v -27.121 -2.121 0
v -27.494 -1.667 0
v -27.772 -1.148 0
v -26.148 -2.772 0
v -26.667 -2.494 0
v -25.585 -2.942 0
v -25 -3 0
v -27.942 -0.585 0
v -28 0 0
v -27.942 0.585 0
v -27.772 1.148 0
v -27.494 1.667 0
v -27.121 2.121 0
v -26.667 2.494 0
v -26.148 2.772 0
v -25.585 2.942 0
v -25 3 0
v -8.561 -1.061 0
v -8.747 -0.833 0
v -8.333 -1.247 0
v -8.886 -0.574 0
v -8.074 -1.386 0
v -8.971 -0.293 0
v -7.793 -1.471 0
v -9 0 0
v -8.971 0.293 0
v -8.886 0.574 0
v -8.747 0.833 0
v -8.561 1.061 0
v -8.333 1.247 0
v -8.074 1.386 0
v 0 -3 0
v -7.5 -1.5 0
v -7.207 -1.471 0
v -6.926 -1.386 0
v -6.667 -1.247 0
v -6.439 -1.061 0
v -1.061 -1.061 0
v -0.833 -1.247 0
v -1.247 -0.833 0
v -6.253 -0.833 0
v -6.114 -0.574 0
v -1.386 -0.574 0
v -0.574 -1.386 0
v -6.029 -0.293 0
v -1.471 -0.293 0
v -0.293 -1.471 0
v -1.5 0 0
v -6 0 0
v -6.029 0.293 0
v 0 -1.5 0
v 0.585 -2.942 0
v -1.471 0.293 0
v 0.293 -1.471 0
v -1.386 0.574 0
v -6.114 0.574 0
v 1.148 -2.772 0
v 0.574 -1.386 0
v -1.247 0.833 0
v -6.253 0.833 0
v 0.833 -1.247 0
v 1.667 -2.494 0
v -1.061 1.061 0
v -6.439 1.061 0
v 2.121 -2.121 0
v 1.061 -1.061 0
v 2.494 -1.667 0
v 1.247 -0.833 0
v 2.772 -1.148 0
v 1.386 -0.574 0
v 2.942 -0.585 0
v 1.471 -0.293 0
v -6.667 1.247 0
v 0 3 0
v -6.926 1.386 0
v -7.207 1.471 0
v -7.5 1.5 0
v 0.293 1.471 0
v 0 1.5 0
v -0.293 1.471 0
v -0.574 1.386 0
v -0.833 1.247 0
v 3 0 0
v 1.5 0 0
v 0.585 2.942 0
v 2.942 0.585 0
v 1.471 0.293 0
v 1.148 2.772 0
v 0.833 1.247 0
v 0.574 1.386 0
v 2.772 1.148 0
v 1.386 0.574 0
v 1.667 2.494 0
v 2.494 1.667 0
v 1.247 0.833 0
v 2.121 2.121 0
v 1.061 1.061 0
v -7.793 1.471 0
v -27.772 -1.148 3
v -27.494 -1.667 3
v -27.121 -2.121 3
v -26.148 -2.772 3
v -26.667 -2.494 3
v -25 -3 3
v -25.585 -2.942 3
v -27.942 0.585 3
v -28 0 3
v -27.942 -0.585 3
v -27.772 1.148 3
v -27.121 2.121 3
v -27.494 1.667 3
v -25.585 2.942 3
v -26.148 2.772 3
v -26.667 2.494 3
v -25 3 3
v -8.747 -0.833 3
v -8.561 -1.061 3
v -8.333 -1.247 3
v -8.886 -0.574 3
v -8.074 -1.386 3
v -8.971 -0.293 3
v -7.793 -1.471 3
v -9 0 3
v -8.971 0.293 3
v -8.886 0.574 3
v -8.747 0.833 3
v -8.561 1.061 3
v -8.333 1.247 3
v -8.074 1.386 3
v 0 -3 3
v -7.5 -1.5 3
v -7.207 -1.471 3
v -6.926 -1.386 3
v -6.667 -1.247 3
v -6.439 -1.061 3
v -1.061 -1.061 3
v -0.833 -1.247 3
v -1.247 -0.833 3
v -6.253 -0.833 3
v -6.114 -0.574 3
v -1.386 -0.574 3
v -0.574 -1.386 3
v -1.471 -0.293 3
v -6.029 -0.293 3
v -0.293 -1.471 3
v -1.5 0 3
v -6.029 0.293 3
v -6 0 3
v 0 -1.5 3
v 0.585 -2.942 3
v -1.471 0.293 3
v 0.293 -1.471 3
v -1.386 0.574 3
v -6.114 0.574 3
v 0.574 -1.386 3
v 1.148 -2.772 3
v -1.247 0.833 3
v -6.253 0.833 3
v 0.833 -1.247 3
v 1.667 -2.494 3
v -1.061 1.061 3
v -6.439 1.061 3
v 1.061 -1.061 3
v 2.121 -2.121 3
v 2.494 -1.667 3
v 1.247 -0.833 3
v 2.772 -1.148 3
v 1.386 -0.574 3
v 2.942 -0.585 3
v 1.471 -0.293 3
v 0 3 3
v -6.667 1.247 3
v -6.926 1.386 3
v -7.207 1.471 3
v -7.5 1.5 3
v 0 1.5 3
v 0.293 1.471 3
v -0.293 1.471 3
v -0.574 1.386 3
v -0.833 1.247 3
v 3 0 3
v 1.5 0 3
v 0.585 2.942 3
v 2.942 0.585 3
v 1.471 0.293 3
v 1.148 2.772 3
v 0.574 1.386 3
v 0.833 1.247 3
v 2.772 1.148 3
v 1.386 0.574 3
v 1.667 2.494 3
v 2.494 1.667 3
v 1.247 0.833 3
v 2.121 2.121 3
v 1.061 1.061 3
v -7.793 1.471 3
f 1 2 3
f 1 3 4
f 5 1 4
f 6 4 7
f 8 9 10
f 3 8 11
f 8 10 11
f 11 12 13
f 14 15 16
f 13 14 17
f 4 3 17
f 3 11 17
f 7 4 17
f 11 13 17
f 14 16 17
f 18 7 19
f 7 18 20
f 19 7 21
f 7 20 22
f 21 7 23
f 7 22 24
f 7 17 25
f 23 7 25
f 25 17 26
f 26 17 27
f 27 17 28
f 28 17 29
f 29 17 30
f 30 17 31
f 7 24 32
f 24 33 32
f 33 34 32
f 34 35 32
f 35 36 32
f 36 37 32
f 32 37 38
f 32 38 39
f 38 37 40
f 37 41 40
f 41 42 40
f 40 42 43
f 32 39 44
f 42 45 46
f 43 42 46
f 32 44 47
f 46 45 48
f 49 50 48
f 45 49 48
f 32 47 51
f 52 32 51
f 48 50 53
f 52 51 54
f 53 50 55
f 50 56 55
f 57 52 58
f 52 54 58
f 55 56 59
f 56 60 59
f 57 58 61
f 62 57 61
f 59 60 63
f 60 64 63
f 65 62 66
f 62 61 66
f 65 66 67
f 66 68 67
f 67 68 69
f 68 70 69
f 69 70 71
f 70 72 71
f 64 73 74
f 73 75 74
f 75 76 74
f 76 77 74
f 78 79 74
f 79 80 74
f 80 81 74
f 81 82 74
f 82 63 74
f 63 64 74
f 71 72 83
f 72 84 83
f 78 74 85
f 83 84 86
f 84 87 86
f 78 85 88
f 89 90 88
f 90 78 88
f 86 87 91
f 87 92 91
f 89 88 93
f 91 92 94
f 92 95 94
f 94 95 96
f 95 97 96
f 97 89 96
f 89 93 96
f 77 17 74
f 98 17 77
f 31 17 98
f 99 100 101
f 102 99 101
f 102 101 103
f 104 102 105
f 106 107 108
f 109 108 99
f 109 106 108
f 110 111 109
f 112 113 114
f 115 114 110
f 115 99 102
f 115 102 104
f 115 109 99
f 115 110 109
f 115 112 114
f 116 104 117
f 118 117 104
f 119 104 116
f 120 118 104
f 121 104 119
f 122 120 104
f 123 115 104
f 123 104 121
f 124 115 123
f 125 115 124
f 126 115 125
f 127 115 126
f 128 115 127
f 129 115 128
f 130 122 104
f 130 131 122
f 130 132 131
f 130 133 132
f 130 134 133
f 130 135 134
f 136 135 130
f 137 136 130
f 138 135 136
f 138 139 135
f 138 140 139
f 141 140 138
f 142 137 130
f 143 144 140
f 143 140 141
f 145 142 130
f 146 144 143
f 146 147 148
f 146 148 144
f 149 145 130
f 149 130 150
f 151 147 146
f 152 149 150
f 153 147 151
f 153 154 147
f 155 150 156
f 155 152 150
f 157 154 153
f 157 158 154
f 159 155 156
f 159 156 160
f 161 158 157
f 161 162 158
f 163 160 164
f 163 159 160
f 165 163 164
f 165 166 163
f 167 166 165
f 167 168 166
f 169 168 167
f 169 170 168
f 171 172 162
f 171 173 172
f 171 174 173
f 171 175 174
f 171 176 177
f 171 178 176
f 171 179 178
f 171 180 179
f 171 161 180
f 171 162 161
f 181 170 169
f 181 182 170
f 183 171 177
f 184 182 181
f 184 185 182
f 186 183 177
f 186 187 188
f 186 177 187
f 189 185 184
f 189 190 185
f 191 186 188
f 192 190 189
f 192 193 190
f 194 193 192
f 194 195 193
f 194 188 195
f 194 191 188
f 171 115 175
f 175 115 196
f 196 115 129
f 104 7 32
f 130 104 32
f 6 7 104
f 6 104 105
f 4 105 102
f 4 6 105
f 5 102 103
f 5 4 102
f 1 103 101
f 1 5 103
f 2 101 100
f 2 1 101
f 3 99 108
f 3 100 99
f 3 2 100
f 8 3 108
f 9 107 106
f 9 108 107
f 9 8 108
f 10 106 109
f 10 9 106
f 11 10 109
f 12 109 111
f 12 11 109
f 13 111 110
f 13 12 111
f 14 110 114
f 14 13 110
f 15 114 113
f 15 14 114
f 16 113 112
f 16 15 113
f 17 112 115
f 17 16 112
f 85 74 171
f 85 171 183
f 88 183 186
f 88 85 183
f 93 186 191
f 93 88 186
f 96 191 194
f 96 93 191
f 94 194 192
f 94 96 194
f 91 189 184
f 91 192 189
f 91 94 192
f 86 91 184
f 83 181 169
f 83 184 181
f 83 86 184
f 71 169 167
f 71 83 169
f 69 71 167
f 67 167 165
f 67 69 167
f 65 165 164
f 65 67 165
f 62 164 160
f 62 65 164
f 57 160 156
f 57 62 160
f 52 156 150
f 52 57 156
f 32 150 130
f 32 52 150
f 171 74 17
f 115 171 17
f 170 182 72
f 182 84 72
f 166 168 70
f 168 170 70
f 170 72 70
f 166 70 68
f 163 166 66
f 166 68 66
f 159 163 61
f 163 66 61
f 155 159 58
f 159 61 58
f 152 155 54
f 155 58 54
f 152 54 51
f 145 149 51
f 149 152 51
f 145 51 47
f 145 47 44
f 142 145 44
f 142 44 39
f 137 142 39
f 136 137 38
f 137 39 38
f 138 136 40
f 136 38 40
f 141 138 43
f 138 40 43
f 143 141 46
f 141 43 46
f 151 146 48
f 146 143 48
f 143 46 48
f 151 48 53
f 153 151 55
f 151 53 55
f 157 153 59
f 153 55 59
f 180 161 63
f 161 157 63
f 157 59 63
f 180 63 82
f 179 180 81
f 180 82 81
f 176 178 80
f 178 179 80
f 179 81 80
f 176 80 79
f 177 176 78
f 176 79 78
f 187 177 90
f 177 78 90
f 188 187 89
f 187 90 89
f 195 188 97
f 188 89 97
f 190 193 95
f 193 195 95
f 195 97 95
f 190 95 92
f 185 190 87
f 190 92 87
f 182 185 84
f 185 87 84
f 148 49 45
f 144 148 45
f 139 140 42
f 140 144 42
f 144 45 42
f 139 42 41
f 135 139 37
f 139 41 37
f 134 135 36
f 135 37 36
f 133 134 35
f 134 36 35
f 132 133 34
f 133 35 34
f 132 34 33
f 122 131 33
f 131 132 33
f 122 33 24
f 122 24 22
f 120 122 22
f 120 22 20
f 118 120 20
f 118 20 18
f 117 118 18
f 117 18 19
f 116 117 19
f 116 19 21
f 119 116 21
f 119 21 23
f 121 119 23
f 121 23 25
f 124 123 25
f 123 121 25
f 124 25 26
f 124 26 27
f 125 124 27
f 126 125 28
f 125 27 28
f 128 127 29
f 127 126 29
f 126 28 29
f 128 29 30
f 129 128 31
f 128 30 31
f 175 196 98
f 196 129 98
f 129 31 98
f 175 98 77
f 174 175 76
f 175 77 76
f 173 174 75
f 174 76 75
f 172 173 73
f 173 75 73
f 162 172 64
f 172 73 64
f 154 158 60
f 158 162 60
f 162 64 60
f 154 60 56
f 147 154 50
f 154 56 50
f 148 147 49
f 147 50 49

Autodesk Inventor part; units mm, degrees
ref_plane "YZ Plane" through (0, 0, 0) normal (1, 0, 0) x (0, 1, 0)
ref_plane "XZ Plane" through (0, 0, 0) normal (0, 1, 0) x (-1, 0, 0)
ref_plane "XY Plane" through (0, 0, 0) normal (0, 0, 1) x (1, 0, 0)
sketch "スケッチ1" plane through (0, 0, 0) normal (0, 0, 1) x (1, 0, 0)
  line L0 (0, 0) -> (-7.5, 0) construction
  line L1 (0, 3) -> (-7.5, 3)
  line L2 (-7.5, -3) -> (0, -3)
  arc A0 (0, -3) -> (0, 3) centre (0, 0) ccw
  arc A1 (-7.5, 3) -> (-7.5, -3) centre (-7.5, 0) ccw
  circle A2 centre (-7.5, 0) radius 1.5
  circle A3 centre (0, 0) radius 1.5
  line L3 (0, 0) -> (-25, 0) construction
  line L4 (0, -3) -> (-25, -3)
  line L5 (-25, 3) -> (0, 3)
  arc A4 (0, -3) -> (0, 3) centre (0, 0) ccw
  arc A5 (-25, 3) -> (-25, -3) centre (-25, 0) ccw
  circle A6 centre (-25, 0) radius 1.5
  point P0 (-3.75, 0)
  point P1 (-12.5, 0)
  dimension "d0" = 6
  dimension "d1" = 7.5
  dimension "d2" = 3
  dimension "d3" = 3
  dimension "d4" = 25
  dimension "d7" = 3
extrude "押し出し1" add sketch "スケッチ1" along normal blind 3 contours A0 L2 A1 L1 | A1 L4 A5 L5 | A6
properties part number "カウンター先端" material "ポリカーボネート、スモーク"
